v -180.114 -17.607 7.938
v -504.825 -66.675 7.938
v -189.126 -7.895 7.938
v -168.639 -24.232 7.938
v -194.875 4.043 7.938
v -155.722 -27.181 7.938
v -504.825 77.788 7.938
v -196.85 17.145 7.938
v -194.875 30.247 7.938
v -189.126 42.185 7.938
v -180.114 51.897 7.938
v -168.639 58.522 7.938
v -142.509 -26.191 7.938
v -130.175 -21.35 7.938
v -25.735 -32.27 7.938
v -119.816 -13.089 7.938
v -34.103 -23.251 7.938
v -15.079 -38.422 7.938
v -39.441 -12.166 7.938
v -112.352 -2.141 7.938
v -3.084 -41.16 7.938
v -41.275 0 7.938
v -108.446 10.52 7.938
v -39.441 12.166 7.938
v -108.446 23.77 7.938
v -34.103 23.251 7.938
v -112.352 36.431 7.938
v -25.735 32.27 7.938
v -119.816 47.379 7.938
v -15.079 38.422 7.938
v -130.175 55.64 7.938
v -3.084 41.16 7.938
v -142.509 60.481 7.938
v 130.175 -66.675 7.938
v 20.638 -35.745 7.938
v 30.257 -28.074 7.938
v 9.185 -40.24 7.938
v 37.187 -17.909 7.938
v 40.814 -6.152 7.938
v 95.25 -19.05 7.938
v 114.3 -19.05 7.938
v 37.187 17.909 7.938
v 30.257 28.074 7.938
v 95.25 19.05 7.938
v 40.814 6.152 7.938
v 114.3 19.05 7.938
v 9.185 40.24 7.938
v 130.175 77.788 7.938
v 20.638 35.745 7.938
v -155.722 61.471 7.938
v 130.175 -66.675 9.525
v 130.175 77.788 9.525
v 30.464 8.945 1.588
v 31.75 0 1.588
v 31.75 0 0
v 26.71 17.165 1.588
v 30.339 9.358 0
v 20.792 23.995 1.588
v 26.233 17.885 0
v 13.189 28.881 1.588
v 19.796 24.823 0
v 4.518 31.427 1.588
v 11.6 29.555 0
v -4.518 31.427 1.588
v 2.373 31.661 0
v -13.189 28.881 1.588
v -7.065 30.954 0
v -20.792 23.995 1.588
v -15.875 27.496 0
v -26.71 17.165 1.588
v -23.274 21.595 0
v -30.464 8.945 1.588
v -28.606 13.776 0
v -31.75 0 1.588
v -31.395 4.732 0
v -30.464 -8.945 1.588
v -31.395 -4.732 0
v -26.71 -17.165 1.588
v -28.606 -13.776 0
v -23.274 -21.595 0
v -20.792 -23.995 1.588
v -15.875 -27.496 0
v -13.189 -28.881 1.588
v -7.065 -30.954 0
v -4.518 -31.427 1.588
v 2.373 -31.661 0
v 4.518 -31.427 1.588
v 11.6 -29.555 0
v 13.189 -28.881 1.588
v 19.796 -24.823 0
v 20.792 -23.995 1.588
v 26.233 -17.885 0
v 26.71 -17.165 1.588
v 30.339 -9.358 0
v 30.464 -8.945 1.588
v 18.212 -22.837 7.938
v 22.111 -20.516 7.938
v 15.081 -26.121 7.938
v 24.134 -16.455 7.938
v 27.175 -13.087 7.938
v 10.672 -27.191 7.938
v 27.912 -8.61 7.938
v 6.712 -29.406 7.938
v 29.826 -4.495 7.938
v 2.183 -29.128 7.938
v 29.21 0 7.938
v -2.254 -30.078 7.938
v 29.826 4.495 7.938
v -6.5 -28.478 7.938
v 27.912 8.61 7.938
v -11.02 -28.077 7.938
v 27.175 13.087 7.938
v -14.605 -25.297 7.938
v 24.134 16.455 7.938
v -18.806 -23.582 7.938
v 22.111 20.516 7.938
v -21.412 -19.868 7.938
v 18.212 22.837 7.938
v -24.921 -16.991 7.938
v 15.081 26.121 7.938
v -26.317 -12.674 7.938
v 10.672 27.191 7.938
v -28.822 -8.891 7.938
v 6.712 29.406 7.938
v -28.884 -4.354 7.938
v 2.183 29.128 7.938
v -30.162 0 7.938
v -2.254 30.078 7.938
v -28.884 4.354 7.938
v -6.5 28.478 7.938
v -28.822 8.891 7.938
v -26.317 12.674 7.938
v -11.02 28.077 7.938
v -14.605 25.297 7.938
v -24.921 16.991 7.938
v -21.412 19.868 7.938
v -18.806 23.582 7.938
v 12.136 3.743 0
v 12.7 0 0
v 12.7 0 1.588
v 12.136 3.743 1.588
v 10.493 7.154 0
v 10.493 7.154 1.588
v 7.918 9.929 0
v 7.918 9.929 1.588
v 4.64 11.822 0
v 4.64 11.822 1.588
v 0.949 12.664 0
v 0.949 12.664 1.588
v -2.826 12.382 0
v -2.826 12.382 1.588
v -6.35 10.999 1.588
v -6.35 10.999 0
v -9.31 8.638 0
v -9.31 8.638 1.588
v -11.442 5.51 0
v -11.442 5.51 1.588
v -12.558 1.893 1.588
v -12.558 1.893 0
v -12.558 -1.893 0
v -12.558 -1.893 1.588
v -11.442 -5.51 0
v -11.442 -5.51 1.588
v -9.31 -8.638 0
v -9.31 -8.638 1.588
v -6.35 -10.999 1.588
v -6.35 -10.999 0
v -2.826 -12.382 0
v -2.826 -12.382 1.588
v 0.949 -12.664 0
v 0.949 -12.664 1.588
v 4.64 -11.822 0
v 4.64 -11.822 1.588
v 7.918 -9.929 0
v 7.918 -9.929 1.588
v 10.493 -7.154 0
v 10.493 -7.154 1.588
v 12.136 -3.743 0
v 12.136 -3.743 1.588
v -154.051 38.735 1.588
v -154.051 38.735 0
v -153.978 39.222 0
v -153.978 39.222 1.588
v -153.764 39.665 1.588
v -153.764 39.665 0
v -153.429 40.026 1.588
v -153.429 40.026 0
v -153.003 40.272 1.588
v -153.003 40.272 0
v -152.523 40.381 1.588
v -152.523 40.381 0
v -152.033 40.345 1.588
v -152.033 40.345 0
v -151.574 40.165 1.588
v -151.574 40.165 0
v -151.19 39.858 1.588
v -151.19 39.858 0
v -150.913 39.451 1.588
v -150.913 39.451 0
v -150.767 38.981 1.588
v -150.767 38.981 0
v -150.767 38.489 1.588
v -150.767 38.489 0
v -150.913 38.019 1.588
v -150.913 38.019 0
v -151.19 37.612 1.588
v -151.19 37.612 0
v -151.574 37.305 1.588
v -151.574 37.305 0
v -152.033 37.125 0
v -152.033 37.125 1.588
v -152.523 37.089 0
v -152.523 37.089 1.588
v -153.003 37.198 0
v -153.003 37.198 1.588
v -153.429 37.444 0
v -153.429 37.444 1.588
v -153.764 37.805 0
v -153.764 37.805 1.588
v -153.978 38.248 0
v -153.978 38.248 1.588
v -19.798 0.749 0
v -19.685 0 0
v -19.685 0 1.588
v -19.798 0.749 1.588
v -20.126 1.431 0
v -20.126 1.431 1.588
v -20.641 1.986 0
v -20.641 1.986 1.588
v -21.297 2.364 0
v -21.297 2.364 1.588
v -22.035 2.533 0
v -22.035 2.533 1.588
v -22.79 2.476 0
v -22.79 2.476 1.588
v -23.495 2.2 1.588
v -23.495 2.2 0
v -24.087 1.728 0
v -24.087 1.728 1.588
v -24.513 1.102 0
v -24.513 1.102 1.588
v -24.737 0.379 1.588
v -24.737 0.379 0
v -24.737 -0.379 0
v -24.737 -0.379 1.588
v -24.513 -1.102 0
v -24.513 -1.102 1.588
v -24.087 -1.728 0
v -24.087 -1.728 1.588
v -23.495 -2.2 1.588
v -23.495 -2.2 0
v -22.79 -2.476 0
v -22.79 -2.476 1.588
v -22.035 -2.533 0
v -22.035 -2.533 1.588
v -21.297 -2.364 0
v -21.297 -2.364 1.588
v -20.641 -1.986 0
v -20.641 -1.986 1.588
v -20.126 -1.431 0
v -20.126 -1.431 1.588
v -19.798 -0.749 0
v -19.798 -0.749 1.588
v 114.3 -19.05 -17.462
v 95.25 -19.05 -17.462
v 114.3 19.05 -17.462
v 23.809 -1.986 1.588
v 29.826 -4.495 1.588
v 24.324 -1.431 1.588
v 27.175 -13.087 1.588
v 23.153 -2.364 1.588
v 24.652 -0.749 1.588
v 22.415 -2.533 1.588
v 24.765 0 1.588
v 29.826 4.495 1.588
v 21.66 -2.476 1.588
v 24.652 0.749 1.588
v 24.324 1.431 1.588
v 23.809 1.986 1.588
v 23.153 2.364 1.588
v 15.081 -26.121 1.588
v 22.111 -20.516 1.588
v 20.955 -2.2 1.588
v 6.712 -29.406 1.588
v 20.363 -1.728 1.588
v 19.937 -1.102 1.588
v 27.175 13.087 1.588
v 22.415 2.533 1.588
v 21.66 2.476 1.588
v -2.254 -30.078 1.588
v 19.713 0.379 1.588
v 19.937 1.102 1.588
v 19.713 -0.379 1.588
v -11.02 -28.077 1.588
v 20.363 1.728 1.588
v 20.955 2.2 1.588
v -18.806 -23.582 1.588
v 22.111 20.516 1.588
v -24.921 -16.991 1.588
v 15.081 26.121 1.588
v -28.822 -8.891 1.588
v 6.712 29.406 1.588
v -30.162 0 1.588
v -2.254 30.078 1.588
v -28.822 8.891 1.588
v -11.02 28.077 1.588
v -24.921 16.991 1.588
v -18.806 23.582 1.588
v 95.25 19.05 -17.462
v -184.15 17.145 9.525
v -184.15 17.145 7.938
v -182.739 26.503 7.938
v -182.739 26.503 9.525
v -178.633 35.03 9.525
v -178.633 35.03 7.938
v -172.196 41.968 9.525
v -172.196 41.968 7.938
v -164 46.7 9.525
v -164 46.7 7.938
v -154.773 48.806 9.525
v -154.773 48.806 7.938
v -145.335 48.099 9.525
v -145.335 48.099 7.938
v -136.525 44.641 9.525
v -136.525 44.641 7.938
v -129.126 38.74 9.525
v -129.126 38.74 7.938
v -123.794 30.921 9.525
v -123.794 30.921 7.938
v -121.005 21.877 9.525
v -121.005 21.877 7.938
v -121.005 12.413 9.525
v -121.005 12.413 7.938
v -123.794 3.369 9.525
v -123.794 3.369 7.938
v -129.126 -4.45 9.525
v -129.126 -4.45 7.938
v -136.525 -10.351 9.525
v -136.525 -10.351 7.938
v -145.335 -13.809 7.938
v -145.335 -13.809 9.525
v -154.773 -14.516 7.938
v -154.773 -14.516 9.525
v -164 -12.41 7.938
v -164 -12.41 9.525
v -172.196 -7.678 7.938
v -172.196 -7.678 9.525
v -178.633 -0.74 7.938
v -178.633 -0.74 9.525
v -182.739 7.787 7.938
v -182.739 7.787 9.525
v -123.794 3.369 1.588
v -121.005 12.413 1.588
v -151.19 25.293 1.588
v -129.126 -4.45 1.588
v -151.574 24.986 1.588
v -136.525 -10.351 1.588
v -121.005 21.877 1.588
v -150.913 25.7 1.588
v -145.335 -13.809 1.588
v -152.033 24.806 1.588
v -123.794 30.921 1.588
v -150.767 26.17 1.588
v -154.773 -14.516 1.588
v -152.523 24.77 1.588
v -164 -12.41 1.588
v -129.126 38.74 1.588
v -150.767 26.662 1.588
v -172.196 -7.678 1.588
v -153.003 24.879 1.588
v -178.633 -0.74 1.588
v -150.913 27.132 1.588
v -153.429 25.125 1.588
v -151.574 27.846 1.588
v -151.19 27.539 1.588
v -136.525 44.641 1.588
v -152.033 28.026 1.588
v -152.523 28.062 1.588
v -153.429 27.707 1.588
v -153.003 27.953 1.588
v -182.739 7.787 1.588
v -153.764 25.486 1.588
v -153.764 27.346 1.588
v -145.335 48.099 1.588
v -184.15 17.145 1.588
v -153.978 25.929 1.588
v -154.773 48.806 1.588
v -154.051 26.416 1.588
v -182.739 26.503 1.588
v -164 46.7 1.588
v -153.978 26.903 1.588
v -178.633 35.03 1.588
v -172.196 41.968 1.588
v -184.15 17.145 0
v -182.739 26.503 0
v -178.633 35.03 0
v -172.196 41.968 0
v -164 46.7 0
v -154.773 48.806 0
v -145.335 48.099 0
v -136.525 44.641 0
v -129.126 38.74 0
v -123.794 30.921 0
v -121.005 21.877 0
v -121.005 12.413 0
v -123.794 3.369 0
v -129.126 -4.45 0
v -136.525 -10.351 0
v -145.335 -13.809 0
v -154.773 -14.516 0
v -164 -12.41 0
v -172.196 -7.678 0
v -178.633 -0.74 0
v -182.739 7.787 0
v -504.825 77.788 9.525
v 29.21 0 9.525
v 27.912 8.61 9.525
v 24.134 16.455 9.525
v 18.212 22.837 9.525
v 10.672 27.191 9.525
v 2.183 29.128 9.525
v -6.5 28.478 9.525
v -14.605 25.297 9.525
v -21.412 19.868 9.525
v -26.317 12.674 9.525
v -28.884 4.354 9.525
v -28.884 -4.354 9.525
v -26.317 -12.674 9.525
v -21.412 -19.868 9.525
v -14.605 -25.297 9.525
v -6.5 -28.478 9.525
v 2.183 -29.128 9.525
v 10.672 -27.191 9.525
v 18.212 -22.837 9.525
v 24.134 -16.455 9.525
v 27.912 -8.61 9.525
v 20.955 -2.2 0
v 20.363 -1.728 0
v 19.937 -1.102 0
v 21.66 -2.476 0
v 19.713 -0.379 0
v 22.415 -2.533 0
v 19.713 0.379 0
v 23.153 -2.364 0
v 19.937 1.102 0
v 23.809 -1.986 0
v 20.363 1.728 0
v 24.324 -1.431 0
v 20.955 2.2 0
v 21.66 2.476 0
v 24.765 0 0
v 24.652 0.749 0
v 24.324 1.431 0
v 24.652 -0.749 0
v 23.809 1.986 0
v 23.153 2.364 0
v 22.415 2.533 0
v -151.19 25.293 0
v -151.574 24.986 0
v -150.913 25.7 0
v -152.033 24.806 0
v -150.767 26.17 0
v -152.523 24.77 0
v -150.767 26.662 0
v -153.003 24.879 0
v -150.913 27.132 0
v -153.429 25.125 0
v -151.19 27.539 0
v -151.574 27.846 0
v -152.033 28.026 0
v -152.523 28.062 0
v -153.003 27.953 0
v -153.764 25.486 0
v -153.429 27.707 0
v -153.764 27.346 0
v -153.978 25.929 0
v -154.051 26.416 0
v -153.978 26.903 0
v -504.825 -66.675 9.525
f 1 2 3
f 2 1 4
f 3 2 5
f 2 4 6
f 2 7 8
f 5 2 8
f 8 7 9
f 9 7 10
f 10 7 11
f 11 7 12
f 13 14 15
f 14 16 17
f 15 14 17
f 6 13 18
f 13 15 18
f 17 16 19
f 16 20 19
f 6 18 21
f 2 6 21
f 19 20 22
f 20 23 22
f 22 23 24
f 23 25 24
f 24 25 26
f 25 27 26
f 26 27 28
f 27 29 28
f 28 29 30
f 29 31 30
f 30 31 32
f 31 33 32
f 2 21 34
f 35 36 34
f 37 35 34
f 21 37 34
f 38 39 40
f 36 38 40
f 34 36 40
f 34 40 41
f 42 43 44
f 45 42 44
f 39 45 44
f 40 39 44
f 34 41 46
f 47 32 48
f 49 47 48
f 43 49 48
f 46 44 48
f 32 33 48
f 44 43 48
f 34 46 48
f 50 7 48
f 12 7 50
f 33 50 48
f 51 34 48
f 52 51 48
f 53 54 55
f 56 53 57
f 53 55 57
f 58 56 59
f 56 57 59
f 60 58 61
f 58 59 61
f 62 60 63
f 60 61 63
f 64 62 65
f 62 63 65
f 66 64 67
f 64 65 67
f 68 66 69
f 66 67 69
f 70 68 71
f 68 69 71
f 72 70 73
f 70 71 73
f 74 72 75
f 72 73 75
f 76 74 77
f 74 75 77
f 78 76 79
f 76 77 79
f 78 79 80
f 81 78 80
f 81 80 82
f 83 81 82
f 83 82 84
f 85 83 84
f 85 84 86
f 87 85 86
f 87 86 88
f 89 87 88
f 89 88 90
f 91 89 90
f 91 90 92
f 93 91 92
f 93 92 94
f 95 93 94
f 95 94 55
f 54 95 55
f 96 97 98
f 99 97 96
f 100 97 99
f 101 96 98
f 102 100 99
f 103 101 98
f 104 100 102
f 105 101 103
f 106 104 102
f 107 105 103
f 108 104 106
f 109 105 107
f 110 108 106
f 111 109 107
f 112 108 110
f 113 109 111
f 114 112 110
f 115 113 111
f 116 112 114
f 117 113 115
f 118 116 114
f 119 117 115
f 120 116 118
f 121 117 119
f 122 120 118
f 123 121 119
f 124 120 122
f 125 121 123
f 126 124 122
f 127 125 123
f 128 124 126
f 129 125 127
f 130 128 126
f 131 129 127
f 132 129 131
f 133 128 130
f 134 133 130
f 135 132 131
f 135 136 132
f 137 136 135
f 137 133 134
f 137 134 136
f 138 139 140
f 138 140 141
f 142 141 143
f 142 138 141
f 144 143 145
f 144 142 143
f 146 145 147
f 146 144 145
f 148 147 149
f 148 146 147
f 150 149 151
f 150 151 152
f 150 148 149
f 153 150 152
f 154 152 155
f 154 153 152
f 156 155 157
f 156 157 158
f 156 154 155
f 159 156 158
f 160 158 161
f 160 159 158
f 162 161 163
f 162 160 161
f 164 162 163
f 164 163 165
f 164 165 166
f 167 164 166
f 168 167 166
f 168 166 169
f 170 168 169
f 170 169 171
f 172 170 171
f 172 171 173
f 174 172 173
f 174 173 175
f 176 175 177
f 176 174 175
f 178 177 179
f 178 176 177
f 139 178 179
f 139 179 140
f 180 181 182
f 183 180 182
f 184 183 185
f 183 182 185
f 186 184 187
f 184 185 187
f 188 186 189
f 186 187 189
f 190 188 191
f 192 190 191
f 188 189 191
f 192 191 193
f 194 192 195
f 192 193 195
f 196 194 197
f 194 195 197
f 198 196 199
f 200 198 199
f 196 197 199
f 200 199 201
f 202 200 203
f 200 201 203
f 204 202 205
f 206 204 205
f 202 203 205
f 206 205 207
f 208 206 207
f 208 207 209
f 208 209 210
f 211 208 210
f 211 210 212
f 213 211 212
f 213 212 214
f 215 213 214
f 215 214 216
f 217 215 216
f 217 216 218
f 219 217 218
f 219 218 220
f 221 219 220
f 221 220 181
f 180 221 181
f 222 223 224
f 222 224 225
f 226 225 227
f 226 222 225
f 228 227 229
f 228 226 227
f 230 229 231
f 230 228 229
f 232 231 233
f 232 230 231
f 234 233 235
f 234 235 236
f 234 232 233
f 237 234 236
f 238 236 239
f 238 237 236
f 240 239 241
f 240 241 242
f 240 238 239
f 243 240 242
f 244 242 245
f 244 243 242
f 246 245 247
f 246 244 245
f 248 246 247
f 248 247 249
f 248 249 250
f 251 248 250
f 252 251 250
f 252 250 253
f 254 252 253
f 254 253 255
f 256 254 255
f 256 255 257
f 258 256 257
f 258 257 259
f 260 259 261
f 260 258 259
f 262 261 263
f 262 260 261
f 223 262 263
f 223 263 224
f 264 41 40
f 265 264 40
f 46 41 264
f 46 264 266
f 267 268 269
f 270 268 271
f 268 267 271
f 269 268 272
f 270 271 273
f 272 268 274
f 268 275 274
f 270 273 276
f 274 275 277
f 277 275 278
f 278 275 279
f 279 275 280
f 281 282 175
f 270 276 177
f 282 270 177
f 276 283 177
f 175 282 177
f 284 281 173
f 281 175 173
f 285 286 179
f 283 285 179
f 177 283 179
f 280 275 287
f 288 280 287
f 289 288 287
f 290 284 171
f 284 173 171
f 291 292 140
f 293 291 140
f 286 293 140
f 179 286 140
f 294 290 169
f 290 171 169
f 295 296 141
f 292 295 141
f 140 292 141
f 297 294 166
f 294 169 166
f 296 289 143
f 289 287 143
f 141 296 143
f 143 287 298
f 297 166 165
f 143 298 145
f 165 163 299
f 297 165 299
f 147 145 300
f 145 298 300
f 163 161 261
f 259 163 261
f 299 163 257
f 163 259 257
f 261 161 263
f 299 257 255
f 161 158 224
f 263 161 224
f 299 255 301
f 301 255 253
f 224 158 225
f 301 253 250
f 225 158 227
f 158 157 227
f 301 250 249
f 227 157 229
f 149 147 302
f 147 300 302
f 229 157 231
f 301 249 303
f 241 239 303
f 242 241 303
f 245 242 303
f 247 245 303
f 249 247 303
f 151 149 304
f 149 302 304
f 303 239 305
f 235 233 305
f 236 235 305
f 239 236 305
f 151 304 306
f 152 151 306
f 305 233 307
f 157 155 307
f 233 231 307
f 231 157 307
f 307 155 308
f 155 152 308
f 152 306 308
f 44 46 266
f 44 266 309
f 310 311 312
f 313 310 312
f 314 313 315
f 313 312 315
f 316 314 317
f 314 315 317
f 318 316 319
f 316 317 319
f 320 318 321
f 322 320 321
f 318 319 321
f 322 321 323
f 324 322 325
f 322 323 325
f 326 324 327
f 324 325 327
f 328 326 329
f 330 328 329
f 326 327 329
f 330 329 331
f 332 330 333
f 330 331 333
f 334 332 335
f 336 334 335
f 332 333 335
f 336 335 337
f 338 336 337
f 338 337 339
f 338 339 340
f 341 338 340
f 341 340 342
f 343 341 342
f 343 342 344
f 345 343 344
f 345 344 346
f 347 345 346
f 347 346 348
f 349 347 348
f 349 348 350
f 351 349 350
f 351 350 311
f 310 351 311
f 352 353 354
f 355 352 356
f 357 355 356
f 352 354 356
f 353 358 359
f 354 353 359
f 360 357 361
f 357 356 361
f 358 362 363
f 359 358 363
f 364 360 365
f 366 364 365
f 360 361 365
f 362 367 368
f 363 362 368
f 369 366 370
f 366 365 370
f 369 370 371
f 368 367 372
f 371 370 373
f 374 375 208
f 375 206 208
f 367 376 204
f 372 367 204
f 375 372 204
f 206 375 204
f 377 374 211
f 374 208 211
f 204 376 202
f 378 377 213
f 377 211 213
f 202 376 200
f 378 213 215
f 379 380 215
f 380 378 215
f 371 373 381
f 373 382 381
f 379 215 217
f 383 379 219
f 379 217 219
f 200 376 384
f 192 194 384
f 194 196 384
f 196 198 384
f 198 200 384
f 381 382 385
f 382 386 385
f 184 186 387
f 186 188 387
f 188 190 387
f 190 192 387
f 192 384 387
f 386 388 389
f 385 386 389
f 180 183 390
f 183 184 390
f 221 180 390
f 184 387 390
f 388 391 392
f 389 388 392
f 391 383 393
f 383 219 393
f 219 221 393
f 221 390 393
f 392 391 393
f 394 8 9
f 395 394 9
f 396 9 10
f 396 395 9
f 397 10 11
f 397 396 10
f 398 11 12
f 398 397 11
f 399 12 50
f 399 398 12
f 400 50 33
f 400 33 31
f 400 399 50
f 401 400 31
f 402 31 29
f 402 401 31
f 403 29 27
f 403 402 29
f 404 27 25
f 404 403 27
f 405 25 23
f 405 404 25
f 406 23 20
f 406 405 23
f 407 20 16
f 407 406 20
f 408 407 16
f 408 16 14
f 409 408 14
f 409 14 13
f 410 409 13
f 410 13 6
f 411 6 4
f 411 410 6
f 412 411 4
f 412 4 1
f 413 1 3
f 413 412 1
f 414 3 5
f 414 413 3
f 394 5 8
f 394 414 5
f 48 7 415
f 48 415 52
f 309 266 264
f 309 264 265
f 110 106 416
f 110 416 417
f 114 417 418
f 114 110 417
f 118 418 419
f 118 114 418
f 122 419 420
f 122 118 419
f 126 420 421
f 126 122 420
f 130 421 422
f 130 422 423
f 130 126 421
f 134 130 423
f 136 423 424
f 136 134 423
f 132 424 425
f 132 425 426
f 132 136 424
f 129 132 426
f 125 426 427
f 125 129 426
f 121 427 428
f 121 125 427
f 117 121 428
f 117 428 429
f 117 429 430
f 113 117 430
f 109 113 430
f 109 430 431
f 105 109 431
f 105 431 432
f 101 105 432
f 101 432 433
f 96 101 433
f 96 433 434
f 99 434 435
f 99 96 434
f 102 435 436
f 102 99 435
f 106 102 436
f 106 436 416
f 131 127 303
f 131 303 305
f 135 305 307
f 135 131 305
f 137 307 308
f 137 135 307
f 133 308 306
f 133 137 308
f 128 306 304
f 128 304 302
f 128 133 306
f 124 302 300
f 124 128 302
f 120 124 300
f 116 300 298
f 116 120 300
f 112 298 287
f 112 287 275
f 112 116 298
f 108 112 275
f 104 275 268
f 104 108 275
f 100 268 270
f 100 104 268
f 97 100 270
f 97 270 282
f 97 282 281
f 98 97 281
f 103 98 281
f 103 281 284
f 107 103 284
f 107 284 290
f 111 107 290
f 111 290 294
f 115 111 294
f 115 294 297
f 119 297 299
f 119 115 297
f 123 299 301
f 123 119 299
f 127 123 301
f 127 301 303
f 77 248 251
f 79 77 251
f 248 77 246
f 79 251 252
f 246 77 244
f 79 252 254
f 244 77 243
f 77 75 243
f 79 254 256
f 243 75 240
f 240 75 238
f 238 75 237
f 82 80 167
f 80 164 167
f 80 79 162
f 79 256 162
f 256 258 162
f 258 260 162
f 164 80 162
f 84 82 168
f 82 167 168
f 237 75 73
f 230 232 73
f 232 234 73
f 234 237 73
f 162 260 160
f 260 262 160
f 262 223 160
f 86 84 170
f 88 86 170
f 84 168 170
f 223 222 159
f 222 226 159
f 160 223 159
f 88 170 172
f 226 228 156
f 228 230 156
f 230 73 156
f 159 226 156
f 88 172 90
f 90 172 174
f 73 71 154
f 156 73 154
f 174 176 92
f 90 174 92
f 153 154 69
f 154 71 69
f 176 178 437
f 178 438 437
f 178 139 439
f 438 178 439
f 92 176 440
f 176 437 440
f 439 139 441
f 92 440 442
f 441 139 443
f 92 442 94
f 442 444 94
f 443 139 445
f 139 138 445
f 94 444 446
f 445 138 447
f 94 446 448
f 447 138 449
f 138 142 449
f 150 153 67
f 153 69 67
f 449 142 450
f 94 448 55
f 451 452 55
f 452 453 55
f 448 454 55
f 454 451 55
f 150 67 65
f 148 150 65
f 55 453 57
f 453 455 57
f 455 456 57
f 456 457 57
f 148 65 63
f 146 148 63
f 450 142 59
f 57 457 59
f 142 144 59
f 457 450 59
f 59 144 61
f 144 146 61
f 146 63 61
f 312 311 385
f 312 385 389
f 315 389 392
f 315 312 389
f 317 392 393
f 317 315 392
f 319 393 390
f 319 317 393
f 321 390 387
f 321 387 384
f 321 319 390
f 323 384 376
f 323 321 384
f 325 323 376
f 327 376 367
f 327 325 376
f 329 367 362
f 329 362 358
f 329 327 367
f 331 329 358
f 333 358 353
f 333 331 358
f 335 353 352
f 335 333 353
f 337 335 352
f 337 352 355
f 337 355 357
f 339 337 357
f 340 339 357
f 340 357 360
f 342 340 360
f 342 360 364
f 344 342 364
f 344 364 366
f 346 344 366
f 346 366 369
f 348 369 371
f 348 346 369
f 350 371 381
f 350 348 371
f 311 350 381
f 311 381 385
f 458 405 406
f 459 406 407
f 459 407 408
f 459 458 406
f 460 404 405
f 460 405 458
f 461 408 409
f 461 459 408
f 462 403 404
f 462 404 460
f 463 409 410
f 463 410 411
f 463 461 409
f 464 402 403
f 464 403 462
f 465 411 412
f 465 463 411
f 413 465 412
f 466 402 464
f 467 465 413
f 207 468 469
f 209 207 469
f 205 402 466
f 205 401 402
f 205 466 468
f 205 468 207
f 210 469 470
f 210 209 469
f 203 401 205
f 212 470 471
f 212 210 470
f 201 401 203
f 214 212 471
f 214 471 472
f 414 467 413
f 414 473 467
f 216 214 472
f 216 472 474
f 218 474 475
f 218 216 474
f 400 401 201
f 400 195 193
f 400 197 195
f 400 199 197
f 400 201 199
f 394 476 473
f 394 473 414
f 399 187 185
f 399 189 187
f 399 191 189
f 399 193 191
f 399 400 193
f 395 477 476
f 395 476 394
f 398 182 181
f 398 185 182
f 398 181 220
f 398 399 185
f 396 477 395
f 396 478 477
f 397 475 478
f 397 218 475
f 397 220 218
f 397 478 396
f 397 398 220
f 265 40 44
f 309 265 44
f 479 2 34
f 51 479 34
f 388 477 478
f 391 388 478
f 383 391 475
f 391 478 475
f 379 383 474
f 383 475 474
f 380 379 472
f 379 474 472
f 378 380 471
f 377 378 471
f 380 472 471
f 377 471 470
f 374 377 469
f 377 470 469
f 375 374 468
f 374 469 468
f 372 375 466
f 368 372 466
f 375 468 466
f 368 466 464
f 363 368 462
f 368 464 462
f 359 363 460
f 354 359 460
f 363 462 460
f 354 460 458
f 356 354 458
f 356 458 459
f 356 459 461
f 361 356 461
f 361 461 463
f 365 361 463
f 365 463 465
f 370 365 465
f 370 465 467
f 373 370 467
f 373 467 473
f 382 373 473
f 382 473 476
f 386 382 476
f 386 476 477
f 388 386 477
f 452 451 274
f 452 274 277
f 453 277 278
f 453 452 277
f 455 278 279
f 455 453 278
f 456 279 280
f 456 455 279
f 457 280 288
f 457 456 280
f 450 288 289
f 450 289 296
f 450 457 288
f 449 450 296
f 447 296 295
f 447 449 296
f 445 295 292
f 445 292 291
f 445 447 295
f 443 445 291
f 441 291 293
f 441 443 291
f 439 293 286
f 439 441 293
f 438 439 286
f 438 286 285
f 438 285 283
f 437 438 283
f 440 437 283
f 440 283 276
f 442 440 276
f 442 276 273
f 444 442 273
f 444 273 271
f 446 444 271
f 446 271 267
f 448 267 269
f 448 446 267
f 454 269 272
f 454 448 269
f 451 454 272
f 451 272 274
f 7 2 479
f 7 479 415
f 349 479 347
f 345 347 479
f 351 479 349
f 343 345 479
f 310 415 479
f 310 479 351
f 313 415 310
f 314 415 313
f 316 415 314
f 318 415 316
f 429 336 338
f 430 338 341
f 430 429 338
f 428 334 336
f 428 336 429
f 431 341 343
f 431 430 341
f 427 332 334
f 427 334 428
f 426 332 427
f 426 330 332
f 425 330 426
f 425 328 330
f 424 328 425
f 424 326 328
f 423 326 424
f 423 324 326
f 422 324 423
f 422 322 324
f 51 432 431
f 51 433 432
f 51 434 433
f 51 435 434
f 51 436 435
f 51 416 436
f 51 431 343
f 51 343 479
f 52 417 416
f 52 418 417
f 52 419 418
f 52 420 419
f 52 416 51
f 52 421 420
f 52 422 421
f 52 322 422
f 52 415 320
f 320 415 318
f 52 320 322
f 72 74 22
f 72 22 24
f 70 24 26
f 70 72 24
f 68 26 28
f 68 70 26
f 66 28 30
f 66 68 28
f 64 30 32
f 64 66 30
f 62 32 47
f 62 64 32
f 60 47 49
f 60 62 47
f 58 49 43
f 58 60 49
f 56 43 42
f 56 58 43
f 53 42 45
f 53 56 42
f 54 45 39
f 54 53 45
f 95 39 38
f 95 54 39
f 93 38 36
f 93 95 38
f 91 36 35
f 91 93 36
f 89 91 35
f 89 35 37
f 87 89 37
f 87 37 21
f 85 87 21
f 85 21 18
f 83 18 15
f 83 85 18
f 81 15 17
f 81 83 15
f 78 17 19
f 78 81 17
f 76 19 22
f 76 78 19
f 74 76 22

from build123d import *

# Parameters (mm, degrees)
SKETCH1_R               = 31.75
SKETCH1_R_2             = 12.7
SKETCH1_R_3             = 2.54
BOSS_EXTRUDE1_DEPTH     = 1.5875
SKETCH3_W               = 635
SKETCH3_H               = 144.4625
SKETCH3_R               = 29.21
BOSS_EXTRUDE2_DEPTH     = 1.5875
SKETCH4_R               = 41.275
SKETCH5_R               = 31.75
SKETCH6_R               = 30.1625
TIMER_HOLE_DEPTH        = 6.35
SKETCH7_W               = 19.05
SKETCH7_H               = 38.1
SOAK_LIGHT_DEPTH        = 25.4
SKETCH8_R               = 44.45
SKETCH9_R               = 31.75
SKETCH10_R              = 31.75
CUT_EXTRUDE1_DEPTH      = 6.35
CUT_EXTRUDE1_DEPTH_BACK = 2.5875
SKETCH11_R              = 1.651
CUT_EXTRUDE2_DEPTH      = 10.525


with BuildPart() as part:
    # Sketch1 → Boss-Extrude1 (new body)
    with BuildSketch(Plane.XY):
        Circle(SKETCH1_R)
        Circle(SKETCH1_R_2, mode=Mode.SUBTRACT)
        with Locations((-22.225, 0)):
            Circle(SKETCH1_R_3, mode=Mode.SUBTRACT)
        with Locations((22.225, 0)):
            Circle(SKETCH1_R_3, mode=Mode.SUBTRACT)
    extrude(amount=BOSS_EXTRUDE1_DEPTH)



with BuildPart() as body_2:
    # Sketch3 → Boss-Extrude2 (new body)
    with BuildSketch(Plane.XY.offset(7.9375)):
        with Locations((-187.325, 5.55625)):
            Rectangle(SKETCH3_W, SKETCH3_H)
        Circle(SKETCH3_R, mode=Mode.SUBTRACT)
    extrude(amount=BOSS_EXTRUDE2_DEPTH)


with BuildPart() as part_1:
    add(part.part)

    add(body_2.part)  # Loft1 merges body 2
    # Sketch4 → Loft1 section 0
    with BuildSketch(Plane(origin=(0, 0, 7.9375), x_dir=(-1, 0, 0), z_dir=(0, 0, -1))):
        Circle(SKETCH4_R)
    # Sketch5 → Loft1 section 1
    with BuildSketch(Plane(origin=(0, 0, 1.5875), x_dir=(-1, 0, 0), z_dir=(0, 0, -1))):
        Circle(SKETCH5_R)
    loft()

    # Sketch6 → Timer hole (cut)
    with BuildSketch(Plane(origin=(0, 0, 7.9375), x_dir=(-1, 0, 0), z_dir=(0, 0, -1))):
        Circle(SKETCH6_R)
    extrude(amount=TIMER_HOLE_DEPTH, mode=Mode.SUBTRACT)

    # Sketch7 → Soak light (add)
    with BuildSketch(Plane(origin=(0, 0, 7.9375), x_dir=(-1, 0, 0), z_dir=(0, 0, -1))):
        with Locations((-104.775, 0)):
            Rectangle(SKETCH7_W, SKETCH7_H)
    extrude(amount=SOAK_LIGHT_DEPTH)

    # Sketch8 → spare mount section 0
    with BuildSketch(Plane(origin=(0, 0, 7.9375), x_dir=(-1, 0, 0), z_dir=(0, 0, -1))):
        with Locations((152.4, 17.145)):
            Circle(SKETCH8_R)
    # Sketch9 → spare mount section 1
    with BuildSketch(Plane(origin=(0, 0, 0), x_dir=(-1, 0, 0), z_dir=(0, 0, -1))):
        with Locations((152.4, 17.145)):
            Circle(SKETCH9_R)
    loft()

    # Sketch10 → Cut-Extrude1 (cut, two sides)
    with BuildSketch(Plane(origin=(0, 0, 7.9375), x_dir=(-1, 0, 0), z_dir=(0, 0, -1))) as cut_extrude1_sk:
        with Locations((152.4, 17.145)):
            Circle(SKETCH10_R)
    extrude(amount=CUT_EXTRUDE1_DEPTH, mode=Mode.SUBTRACT)
    extrude(cut_extrude1_sk.sketch, amount=-CUT_EXTRUDE1_DEPTH_BACK, mode=Mode.SUBTRACT)

    # Sketch11 → Cut-Extrude2 (cut, through all)
    with BuildSketch(Plane(origin=(0, 0, 0), x_dir=(-1, 0, 0), z_dir=(0, 0, -1))):
        with Locations((152.4, 26.416)):
            Circle(SKETCH11_R)
        with Locations((152.4, 38.735)):
            Circle(SKETCH11_R)
    extrude(amount=-CUT_EXTRUDE2_DEPTH, mode=Mode.SUBTRACT)


solid = part_1.part
